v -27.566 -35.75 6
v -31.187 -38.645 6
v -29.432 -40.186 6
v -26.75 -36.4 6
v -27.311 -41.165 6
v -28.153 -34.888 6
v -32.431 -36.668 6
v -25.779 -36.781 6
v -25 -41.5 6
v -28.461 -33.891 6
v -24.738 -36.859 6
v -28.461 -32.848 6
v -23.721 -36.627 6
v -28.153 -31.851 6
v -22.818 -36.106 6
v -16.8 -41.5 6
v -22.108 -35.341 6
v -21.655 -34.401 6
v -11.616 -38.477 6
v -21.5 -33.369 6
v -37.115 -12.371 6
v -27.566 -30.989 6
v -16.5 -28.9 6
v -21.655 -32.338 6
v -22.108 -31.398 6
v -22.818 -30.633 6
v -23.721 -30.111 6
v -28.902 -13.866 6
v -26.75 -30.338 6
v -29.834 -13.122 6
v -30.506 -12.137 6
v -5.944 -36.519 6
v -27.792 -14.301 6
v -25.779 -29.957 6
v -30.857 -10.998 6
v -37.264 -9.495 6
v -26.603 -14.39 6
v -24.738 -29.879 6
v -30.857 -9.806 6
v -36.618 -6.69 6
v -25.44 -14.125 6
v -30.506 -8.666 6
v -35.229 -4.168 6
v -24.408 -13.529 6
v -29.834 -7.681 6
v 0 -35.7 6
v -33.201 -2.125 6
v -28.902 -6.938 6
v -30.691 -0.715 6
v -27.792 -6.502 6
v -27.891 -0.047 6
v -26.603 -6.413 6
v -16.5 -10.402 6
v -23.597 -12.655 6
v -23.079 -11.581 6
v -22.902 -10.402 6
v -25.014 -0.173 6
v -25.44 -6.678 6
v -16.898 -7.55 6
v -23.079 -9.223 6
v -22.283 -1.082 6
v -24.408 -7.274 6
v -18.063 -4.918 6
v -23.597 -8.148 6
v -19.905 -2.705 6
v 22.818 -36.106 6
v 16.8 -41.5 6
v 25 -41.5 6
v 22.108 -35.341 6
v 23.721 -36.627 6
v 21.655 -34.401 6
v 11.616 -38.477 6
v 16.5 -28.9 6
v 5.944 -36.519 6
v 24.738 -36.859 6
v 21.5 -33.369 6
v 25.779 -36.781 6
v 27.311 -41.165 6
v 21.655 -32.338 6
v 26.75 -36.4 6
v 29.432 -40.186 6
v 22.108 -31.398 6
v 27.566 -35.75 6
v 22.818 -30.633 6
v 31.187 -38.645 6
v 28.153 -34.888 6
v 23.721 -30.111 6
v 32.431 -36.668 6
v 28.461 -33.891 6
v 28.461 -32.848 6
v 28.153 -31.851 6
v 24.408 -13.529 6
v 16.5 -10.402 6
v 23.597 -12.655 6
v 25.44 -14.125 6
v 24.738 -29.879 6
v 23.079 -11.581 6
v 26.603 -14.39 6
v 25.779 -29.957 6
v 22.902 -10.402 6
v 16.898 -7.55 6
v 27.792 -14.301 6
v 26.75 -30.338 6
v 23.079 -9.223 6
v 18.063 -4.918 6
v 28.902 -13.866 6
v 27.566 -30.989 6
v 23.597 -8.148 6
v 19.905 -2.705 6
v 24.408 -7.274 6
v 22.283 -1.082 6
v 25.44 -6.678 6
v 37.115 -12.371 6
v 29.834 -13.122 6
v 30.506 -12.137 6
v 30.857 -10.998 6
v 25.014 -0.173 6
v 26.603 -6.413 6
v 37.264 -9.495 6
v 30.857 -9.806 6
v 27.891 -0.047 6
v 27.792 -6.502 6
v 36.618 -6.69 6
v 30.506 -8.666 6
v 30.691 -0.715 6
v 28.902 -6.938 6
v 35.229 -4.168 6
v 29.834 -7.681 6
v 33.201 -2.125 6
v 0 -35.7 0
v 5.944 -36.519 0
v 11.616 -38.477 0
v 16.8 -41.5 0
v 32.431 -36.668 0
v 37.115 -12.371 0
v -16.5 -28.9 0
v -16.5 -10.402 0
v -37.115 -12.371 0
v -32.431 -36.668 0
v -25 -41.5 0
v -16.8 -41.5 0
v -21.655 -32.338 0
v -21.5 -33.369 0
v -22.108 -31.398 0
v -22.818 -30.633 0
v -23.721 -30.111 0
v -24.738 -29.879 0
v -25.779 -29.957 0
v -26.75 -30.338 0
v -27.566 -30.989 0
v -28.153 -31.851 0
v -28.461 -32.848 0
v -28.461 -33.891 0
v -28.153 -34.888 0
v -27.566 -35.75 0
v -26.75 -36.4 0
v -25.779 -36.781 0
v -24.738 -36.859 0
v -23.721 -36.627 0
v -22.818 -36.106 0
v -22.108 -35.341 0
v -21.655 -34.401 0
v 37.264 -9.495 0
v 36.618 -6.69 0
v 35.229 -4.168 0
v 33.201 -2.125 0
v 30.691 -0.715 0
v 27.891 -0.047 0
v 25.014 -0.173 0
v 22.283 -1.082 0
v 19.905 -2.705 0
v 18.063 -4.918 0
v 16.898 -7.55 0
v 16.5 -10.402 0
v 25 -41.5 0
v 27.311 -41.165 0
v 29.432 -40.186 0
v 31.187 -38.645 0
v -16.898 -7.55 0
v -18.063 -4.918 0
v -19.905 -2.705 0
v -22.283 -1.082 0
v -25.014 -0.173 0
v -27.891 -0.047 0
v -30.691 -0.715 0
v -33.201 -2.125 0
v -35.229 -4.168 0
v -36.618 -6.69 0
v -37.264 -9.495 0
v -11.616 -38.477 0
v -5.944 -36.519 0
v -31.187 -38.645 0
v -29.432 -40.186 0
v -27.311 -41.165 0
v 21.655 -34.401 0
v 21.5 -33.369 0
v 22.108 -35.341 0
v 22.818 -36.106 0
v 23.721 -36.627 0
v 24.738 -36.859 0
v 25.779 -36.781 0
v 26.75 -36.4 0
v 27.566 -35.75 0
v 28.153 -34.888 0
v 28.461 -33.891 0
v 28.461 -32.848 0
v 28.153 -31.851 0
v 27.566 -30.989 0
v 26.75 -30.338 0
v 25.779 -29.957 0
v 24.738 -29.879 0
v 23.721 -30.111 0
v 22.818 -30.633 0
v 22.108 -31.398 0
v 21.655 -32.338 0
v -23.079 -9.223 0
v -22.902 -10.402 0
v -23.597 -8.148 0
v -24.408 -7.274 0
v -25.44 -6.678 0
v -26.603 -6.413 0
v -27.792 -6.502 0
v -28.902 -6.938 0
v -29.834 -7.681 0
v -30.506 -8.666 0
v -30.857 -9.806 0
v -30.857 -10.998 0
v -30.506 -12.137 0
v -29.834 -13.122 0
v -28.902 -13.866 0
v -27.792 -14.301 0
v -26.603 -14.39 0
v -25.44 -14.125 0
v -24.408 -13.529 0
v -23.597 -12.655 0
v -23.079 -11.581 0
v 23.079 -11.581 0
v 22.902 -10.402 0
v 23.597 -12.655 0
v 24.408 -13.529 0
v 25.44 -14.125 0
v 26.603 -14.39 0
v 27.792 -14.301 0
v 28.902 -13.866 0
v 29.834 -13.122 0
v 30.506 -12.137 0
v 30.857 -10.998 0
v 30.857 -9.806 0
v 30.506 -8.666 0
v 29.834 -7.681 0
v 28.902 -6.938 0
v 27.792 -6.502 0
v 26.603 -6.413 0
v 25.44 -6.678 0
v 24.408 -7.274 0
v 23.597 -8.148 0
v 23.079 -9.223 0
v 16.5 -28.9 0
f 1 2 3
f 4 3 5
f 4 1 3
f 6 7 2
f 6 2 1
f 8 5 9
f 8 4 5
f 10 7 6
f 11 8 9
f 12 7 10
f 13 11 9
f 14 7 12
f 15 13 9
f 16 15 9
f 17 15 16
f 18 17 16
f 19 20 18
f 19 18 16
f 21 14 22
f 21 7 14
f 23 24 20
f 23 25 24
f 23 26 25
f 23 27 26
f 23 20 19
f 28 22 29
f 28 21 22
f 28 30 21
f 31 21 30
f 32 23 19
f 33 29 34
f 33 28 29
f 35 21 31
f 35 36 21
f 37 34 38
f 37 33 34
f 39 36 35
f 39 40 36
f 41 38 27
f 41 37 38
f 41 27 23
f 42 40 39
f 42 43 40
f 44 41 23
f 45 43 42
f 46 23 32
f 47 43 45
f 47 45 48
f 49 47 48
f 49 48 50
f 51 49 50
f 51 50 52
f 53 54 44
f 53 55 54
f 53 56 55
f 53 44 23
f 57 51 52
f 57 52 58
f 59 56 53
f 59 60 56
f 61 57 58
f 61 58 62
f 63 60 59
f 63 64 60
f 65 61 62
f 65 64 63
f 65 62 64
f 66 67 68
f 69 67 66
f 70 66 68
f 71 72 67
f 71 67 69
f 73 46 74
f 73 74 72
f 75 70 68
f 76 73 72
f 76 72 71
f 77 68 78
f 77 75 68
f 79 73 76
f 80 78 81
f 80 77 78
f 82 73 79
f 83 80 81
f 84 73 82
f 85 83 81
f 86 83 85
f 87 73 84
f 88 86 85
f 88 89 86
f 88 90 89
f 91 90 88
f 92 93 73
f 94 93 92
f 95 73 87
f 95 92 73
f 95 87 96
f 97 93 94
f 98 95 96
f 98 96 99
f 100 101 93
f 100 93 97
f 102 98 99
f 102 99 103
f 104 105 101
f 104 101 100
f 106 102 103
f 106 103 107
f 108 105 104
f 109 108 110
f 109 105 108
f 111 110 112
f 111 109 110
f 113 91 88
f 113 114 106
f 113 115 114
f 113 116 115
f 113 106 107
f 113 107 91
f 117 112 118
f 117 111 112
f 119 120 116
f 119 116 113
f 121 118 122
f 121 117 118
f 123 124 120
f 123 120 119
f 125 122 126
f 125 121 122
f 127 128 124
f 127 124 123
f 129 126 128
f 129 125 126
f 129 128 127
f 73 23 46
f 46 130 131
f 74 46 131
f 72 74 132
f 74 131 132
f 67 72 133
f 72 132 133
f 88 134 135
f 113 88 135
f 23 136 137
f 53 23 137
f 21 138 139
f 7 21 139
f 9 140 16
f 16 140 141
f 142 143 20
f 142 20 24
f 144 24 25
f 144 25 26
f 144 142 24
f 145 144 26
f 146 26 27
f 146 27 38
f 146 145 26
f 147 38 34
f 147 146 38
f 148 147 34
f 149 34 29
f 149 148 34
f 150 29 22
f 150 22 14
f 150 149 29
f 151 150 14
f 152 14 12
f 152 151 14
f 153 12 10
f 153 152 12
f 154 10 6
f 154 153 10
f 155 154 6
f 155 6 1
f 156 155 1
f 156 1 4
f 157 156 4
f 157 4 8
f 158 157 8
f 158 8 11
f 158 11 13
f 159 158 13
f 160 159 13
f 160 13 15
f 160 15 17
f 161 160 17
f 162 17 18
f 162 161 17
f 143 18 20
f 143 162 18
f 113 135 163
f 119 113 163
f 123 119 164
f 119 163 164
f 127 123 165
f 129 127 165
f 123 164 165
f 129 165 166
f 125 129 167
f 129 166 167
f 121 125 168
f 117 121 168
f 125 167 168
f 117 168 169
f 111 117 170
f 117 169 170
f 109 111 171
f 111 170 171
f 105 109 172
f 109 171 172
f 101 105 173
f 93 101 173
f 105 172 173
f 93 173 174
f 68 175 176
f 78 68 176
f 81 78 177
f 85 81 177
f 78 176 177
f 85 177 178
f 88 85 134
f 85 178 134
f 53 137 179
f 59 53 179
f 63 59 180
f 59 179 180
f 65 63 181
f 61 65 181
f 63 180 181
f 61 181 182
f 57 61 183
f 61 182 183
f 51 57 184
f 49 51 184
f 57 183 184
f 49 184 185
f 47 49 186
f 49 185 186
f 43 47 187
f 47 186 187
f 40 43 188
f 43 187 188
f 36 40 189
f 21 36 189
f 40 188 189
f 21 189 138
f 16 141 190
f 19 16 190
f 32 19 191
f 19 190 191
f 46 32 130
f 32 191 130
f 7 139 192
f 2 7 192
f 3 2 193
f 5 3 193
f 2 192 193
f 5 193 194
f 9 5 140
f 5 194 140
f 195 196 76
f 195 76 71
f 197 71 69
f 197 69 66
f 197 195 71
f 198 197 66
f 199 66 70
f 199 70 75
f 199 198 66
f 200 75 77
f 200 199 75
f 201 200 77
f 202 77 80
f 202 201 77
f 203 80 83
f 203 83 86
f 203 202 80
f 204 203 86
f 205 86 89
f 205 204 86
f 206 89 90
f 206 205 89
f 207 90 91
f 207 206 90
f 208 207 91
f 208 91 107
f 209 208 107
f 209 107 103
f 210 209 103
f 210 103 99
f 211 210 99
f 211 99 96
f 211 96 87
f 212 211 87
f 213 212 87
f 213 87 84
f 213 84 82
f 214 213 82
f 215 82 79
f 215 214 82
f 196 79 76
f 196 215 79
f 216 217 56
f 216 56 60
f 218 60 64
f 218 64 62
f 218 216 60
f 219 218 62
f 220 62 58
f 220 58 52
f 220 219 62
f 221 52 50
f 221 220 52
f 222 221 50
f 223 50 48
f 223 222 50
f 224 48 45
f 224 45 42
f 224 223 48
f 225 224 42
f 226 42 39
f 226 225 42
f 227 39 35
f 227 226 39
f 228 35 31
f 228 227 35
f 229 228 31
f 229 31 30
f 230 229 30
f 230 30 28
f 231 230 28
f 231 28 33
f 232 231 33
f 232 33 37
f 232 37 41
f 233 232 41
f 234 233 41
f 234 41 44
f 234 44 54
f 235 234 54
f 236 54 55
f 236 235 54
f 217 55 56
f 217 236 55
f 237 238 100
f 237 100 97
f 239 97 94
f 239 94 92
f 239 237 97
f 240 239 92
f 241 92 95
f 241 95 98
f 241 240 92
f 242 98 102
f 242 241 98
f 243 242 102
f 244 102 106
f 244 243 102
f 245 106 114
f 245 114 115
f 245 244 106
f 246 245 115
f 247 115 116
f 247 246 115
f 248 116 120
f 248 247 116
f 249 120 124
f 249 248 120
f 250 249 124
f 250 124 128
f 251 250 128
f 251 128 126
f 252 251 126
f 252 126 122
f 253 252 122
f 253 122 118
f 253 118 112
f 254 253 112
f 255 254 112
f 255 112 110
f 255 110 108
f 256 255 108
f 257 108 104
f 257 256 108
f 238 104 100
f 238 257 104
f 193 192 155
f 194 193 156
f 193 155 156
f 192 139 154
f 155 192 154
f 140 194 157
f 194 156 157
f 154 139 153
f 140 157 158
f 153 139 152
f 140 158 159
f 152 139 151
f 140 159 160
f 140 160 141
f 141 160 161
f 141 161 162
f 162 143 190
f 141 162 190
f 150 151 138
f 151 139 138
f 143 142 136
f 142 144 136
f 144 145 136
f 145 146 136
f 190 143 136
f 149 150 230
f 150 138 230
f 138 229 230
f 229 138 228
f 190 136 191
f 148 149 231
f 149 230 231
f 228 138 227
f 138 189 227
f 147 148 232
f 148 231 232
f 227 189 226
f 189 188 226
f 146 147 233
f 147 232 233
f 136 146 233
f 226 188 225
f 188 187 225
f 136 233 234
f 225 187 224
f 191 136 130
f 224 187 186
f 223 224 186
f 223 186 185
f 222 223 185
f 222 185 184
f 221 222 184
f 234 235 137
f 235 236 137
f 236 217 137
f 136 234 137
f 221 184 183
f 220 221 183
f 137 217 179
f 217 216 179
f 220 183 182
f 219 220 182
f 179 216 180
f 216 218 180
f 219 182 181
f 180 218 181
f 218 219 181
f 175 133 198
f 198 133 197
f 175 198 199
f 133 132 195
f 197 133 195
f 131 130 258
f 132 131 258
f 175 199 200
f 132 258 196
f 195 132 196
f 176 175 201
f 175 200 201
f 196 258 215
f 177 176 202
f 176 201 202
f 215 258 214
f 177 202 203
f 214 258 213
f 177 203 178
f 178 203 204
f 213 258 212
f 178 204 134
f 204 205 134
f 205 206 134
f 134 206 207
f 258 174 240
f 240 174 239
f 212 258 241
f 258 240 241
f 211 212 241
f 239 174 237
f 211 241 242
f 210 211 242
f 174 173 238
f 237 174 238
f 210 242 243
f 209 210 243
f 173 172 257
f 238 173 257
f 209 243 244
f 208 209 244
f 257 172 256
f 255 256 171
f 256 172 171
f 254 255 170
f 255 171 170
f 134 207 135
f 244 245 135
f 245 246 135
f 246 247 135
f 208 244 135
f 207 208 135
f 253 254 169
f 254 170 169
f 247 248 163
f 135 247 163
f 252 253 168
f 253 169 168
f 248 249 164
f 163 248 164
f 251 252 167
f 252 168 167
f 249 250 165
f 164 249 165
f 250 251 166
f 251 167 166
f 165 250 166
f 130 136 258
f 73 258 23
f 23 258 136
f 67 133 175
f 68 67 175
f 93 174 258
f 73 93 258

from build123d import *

# Parameters (mm, degrees)
SKETCH1_R           = 4
SKETCH1_R_2         = 3.5
BOSS_EXTRUDE1_DEPTH = 6


with BuildPart() as part:
    # Sketch1 → Boss-Extrude1 (new body)
    with BuildSketch(Plane.XY):
        with BuildLine():
            Line((-25, -41.5), (-16.8, -41.5))
            ThreePointArc((-16.8, -41.5), (-8.828360495, -37.359231669), (0, -35.7))
            ThreePointArc((0, -35.7), (8.828360495, -37.359231669), (16.8, -41.5))
            Line((16.8, -41.5), (25, -41.5))
            ThreePointArc((25, -41.5), (29.432022337, -40.185877375), (32.431413249, -36.668293768))
            Line((32.431413249, -36.668293768), (37.115311752, -12.370570289))
            ThreePointArc((37.115311752, -12.370570289), (27.890603154, -0.04711718), (16.5, -10.401676805))
            Line((16.5, -10.401676805), (16.5, -28.9))
            Line((16.5, -28.9), (-16.5, -28.9))
            Line((-16.5, -28.9), (-16.5, -10.401676805))
            ThreePointArc((-16.5, -10.401676805), (-27.890603154, -0.04711718), (-37.115311752, -12.370570289))
            Line((-37.115311752, -12.370570289), (-32.431413249, -36.668293768))
            ThreePointArc((-32.431413249, -36.668293768), (-29.432022337, -40.185877375), (-25, -41.5))
        make_face()
        with Locations((-26.901676805, -10.401676805)):
            Circle(SKETCH1_R, mode=Mode.SUBTRACT)
        with Locations((-25, -33.369198558)):
            Circle(SKETCH1_R_2, mode=Mode.SUBTRACT)
        with Locations(Location((25, -33.369198558, 0), (0, 0, 180))):
            Circle(SKETCH1_R_2, mode=Mode.SUBTRACT)
        with Locations(Location((26.901676805, -10.401676805, 0), (0, 0, 180))):
            Circle(SKETCH1_R, mode=Mode.SUBTRACT)
    extrude(amount=BOSS_EXTRUDE1_DEPTH)


solid = part.part
